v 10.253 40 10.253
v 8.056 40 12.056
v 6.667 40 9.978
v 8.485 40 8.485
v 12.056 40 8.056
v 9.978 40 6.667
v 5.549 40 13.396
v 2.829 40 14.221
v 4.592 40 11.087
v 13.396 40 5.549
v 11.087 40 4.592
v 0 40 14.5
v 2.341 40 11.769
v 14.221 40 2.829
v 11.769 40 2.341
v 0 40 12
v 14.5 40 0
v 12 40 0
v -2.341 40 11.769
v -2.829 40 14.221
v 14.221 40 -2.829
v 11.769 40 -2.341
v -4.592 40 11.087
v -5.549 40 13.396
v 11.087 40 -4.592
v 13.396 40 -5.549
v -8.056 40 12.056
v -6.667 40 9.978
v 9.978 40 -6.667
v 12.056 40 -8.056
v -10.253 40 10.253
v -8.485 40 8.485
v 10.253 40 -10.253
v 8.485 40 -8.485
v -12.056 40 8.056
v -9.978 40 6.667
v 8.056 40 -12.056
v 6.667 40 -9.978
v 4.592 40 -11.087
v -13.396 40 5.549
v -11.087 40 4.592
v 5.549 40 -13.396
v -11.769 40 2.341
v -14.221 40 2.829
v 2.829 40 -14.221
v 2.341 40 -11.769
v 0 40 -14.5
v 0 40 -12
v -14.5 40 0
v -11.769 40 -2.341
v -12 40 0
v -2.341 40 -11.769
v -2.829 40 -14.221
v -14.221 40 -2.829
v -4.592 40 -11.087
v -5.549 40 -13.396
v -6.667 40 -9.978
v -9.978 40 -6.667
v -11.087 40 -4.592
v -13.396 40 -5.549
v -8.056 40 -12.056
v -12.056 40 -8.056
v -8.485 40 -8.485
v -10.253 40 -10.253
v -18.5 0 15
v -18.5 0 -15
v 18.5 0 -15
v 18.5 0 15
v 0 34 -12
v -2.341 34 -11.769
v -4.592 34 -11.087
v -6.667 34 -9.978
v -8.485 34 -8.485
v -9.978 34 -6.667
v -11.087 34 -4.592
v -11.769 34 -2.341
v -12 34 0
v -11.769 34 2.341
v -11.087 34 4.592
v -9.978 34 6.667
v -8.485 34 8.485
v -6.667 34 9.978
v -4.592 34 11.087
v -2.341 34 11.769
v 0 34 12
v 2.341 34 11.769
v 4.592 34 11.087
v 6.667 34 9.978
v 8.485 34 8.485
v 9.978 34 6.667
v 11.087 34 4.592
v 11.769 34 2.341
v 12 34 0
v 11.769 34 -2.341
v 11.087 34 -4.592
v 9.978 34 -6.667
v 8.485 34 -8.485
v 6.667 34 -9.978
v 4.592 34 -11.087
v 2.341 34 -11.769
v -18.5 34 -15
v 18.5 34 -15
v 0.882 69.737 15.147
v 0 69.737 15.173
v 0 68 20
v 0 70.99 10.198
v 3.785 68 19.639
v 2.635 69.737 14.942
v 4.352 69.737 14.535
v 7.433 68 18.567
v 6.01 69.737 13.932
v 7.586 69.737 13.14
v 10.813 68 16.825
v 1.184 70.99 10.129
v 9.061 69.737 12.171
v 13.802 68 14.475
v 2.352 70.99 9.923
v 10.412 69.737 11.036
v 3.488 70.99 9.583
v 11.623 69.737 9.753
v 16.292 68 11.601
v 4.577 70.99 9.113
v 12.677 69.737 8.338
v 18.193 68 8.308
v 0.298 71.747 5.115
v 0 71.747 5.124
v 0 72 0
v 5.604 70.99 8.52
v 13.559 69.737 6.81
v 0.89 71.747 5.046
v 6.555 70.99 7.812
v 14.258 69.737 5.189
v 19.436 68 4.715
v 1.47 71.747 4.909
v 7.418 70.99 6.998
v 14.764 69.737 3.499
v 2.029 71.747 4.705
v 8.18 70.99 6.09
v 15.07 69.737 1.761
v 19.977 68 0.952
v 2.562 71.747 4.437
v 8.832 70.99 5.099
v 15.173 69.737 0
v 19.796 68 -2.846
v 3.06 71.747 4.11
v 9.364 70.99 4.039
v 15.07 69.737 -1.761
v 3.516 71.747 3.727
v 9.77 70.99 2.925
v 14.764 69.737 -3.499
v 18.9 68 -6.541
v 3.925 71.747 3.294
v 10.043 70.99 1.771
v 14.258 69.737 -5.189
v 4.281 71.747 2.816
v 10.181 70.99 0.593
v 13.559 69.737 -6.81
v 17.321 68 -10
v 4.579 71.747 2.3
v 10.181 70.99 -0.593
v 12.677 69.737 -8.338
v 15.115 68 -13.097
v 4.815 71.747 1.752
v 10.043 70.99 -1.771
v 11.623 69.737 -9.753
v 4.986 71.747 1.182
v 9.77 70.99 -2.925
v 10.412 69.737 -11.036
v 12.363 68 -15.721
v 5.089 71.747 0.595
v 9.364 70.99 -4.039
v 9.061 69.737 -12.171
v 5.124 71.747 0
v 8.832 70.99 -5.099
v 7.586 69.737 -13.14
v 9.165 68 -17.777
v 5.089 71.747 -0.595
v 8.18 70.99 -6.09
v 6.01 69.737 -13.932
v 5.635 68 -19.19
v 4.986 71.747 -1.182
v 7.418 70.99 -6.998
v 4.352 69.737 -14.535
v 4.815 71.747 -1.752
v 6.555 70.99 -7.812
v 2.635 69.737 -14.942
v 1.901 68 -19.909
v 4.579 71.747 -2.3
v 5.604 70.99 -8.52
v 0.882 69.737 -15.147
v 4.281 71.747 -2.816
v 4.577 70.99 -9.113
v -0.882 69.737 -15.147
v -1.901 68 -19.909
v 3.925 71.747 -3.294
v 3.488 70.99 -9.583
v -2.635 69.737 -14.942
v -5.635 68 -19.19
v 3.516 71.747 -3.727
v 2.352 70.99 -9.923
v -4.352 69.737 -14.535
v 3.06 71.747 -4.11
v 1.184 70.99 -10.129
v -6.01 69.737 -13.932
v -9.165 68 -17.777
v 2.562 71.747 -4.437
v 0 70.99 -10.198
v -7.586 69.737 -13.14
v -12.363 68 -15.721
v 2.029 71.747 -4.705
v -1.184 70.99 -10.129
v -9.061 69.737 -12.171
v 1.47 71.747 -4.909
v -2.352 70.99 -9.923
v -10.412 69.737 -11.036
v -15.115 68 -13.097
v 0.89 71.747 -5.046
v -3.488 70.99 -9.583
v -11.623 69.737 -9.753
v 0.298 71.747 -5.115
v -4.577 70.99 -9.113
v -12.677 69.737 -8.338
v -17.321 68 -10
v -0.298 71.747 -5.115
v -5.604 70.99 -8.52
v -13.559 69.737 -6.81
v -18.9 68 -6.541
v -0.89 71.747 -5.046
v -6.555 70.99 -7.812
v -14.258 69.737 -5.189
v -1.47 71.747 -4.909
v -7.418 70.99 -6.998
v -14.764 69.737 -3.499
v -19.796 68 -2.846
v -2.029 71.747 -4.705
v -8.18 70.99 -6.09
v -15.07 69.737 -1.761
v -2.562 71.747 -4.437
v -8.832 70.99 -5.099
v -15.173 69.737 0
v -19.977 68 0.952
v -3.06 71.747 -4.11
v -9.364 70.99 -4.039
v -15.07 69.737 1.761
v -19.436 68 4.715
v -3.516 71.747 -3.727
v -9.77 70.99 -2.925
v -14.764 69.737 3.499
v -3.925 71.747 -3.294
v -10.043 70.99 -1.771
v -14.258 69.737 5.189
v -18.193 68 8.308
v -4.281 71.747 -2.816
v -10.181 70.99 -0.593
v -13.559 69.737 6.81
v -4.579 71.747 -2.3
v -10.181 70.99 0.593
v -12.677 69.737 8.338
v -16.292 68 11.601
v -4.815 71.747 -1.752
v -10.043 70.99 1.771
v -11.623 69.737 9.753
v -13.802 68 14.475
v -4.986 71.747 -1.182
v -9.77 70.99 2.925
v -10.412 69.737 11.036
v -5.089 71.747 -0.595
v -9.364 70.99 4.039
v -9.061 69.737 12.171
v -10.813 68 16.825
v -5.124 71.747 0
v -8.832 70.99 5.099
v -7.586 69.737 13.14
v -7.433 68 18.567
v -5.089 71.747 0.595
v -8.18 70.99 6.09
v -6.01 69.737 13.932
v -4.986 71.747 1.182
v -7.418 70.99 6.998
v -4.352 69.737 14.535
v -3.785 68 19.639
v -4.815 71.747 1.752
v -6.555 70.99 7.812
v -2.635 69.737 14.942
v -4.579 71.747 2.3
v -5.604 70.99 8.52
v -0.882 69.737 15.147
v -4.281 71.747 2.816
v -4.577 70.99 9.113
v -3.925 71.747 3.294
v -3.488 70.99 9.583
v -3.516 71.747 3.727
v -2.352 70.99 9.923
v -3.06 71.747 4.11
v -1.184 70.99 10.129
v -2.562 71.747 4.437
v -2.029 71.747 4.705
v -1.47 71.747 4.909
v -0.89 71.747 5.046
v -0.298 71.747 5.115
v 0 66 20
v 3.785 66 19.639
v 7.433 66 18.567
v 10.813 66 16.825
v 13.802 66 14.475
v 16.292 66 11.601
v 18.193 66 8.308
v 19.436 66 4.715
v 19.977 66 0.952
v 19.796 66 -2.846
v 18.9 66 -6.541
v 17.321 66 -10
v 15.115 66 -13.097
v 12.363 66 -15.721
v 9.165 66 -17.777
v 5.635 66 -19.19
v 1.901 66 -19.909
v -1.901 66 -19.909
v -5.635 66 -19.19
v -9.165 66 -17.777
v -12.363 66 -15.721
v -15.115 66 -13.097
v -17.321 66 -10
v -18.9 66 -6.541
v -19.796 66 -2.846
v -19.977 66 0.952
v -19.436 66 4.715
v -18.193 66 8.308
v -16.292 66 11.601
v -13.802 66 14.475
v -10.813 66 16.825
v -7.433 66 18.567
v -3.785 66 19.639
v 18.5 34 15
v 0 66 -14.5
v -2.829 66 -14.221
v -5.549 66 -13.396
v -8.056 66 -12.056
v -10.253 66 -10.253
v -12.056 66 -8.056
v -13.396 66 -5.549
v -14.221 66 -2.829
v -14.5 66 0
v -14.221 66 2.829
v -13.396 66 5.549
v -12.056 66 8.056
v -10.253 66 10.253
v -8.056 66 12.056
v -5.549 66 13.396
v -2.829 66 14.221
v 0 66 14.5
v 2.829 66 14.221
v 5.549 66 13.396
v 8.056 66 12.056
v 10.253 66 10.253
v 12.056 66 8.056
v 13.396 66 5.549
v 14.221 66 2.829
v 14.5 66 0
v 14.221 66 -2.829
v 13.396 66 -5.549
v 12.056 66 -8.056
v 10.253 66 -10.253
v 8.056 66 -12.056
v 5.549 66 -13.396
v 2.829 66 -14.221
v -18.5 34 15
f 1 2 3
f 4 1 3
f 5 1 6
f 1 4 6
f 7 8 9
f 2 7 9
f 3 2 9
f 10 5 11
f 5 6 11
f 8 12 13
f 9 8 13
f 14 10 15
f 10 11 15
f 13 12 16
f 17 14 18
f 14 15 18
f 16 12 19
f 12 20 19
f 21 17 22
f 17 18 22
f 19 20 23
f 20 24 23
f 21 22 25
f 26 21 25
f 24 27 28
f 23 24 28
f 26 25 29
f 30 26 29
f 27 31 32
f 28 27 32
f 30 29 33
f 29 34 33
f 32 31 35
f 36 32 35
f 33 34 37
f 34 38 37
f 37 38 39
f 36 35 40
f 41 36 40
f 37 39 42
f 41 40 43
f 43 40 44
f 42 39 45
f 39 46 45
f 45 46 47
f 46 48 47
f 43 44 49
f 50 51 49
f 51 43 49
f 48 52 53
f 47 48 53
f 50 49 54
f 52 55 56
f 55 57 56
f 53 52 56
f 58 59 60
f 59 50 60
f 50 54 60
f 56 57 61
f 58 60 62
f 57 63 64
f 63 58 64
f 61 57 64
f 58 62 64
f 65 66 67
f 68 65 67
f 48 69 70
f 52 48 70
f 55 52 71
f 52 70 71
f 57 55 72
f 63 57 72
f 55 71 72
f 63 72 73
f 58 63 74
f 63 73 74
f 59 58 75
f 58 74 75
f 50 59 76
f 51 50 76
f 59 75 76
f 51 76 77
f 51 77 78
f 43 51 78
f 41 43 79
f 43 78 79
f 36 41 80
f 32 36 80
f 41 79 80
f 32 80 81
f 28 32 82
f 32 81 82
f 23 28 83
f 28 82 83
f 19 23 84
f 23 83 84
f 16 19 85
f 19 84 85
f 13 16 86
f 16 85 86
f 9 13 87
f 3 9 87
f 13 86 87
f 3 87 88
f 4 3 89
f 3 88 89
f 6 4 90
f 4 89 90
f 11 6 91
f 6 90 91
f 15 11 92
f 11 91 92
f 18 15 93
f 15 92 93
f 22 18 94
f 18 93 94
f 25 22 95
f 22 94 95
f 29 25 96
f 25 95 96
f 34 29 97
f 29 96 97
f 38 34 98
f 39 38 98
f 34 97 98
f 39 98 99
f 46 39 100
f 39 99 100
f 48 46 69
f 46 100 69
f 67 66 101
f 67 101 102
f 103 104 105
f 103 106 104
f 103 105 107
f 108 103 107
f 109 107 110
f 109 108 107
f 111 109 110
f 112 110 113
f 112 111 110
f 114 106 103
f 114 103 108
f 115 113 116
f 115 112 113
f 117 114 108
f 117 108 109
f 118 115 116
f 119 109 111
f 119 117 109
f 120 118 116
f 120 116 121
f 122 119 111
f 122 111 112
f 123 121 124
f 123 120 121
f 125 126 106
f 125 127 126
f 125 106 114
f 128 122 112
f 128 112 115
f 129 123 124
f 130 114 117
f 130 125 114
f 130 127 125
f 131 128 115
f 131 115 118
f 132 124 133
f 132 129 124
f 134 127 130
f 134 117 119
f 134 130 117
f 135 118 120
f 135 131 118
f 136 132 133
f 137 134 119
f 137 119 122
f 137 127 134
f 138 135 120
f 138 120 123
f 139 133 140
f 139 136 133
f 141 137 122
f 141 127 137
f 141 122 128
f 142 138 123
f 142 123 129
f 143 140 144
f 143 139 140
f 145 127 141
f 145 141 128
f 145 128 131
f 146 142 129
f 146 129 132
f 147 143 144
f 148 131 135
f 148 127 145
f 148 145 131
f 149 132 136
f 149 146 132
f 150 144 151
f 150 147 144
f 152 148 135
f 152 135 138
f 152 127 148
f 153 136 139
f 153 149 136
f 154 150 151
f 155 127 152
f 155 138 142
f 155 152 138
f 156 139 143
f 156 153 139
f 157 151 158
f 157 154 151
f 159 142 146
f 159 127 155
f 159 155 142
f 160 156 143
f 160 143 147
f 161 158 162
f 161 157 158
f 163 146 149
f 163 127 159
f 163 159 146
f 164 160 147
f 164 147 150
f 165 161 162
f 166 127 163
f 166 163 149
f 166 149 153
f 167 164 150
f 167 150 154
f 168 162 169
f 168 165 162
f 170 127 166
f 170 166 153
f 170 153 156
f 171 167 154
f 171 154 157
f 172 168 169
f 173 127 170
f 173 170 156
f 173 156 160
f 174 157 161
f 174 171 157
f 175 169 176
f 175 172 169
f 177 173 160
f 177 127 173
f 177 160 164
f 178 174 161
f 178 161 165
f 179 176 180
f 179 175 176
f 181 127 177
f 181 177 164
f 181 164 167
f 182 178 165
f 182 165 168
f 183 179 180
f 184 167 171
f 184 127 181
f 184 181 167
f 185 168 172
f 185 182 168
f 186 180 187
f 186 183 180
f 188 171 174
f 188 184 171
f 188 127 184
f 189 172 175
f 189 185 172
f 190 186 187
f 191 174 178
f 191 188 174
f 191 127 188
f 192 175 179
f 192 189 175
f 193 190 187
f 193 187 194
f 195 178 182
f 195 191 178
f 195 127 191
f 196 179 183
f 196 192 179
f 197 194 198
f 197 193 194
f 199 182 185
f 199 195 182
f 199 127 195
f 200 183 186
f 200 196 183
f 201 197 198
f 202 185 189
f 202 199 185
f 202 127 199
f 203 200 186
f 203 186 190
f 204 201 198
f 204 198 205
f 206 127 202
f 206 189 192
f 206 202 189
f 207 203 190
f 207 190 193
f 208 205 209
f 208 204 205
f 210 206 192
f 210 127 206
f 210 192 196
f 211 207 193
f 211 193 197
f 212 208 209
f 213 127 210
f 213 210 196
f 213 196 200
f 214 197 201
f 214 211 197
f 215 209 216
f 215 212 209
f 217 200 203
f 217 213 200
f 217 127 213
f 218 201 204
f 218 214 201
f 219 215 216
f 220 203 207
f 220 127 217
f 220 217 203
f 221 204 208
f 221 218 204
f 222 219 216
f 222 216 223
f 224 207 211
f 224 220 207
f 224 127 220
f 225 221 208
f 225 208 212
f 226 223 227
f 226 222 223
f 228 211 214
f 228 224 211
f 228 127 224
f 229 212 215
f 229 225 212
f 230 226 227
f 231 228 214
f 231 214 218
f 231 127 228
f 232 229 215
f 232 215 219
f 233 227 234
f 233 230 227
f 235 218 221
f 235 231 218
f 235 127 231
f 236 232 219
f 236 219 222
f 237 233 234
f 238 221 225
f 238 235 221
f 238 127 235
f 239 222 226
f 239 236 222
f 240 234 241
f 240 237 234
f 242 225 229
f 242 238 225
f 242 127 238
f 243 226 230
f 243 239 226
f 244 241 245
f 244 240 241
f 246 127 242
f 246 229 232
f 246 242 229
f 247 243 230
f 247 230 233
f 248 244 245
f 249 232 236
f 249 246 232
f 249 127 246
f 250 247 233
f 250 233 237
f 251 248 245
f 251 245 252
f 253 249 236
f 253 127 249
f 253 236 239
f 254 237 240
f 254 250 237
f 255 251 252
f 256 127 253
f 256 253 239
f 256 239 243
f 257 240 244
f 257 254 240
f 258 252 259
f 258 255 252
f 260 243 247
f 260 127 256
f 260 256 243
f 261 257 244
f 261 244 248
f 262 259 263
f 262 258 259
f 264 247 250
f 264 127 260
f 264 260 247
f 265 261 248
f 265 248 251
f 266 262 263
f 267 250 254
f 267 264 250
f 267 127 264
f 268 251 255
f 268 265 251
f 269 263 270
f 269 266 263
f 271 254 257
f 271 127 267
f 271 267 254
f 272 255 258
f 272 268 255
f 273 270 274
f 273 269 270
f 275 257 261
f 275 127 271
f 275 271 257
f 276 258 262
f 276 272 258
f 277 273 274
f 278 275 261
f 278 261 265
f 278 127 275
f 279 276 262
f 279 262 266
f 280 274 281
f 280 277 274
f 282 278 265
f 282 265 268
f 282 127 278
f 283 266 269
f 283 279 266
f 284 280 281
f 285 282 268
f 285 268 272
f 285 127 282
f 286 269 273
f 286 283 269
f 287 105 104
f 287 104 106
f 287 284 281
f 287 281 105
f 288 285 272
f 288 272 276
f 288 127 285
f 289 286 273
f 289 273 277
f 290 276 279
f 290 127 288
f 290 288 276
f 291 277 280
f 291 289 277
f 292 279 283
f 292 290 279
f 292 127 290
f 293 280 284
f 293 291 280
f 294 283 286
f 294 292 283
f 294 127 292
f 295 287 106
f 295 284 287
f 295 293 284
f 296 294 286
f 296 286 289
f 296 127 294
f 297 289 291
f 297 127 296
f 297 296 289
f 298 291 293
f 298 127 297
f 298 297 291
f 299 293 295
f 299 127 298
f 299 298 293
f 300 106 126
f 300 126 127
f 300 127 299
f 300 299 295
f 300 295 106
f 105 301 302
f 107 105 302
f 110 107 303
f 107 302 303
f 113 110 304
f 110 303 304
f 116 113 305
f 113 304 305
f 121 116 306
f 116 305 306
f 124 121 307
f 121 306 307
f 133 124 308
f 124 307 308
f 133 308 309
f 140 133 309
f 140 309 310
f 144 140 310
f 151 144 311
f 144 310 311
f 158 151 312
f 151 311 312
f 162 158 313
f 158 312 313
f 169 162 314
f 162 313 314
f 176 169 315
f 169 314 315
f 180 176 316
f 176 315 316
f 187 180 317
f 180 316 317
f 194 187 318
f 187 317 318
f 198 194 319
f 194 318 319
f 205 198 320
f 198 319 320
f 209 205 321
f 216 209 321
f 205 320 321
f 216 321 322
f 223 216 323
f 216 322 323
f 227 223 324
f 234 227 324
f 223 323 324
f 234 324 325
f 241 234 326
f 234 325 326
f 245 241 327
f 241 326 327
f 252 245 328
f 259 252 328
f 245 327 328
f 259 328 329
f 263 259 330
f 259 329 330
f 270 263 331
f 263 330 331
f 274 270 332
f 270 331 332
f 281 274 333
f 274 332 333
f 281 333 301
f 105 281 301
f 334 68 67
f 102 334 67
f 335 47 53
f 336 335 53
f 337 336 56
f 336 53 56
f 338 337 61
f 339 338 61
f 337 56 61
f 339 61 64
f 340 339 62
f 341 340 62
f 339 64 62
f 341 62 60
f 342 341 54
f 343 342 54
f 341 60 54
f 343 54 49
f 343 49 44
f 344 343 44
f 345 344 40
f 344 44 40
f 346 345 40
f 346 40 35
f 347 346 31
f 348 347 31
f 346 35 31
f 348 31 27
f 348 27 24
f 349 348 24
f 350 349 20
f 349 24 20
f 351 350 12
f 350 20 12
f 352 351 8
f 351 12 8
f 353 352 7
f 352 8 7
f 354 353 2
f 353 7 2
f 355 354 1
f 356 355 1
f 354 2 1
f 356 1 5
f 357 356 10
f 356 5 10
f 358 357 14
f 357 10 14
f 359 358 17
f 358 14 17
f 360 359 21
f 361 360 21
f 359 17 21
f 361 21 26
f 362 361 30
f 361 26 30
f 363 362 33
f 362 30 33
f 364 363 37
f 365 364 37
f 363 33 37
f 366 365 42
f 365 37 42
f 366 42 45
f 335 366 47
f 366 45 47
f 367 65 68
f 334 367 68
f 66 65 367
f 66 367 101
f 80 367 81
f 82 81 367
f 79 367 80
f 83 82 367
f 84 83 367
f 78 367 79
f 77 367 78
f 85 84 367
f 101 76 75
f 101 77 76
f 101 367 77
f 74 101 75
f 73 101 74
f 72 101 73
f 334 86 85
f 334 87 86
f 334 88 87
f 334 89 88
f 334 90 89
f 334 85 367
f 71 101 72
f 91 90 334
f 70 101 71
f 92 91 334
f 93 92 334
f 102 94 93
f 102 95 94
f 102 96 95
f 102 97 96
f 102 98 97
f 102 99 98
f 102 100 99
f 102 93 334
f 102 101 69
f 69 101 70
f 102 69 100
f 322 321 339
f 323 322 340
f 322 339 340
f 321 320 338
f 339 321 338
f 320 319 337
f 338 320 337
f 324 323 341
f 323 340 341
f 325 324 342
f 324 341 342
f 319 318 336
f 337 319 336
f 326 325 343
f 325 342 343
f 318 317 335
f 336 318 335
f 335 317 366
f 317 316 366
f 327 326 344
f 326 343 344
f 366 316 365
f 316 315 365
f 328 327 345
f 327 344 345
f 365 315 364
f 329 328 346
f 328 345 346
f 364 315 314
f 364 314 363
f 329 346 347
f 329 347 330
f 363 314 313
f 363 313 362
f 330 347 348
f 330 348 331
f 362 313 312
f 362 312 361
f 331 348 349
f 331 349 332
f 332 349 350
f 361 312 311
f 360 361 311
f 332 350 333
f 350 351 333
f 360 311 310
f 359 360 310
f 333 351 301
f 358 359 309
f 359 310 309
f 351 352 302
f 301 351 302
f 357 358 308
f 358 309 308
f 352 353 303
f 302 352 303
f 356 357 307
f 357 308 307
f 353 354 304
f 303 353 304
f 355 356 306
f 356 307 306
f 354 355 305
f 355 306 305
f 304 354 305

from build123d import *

# Parameters (mm, degrees)
SKETCH_1_W         = 37
SKETCH_1_H         = 30
EXTRUDE_1_DEPTH    = 34
SKETCH_2_R         = 12
EXTRUDE_2_DEPTH    = 6
SKETCH_3_R         = 14.5
EXTRUDE_3_DEPTH    = 26
SKETCH_4_R         = 20
EXTRUDE_4_DEPTH    = 2
DOME_1_FACE_RADIUS = 20
DOME_1_HEIGHT      = 4


with BuildPart() as part:
    # 草图1 → 凸台-拉伸1 (new body)
    with BuildSketch(Plane(origin=(0, 0, 0), x_dir=(1, 0, 0), z_dir=(0, 1, 0))):
        Rectangle(SKETCH_1_W, SKETCH_1_H)
    extrude(amount=EXTRUDE_1_DEPTH)

    # 草图2 → 凸台-拉伸2 (add)
    with BuildSketch(Plane(origin=(0, 34, 0), x_dir=(1, 0, 0), z_dir=(0, 1, 0))):
        with Locations(Location((0, 0, 0), (0, 0, 90))):
            Circle(SKETCH_2_R)
    extrude(amount=EXTRUDE_2_DEPTH)

    # 草图3 → 凸台-拉伸3 (add)
    with BuildSketch(Plane(origin=(0, 40, 0), x_dir=(1, 0, 0), z_dir=(0, 1, 0))):
        with Locations(Location((0, 0, 0), (0, 0, 90))):
            Circle(SKETCH_3_R)
    extrude(amount=EXTRUDE_3_DEPTH)

    # 草图4 → 凸台-拉伸4 (add)
    with BuildSketch(Plane(origin=(0, 66, 0), x_dir=(1, 0, 0), z_dir=(0, 1, 0))):
        with Locations(Location((0, 0, 0), (0, 0, 270))):
            Circle(SKETCH_4_R)
    extrude(amount=EXTRUDE_4_DEPTH)

    # 圆顶1: a dome of height H over a round flat face of radius A is a cap of a sphere of radius (A * A + H * H) / (2 * H)
    dome_1_r = (DOME_1_FACE_RADIUS * DOME_1_FACE_RADIUS + DOME_1_HEIGHT * DOME_1_HEIGHT) / (2 * DOME_1_HEIGHT)
    dome_1_base = Plane((0, 68, 0), z_dir=(0, 1, 0))
    with Locations(dome_1_base.offset(DOME_1_HEIGHT - dome_1_r)):
        dome_1_ball = Sphere(dome_1_r, mode=Mode.PRIVATE)
    add(split(dome_1_ball, bisect_by=dome_1_base, keep=Keep.TOP, mode=Mode.PRIVATE))


solid = part.part
